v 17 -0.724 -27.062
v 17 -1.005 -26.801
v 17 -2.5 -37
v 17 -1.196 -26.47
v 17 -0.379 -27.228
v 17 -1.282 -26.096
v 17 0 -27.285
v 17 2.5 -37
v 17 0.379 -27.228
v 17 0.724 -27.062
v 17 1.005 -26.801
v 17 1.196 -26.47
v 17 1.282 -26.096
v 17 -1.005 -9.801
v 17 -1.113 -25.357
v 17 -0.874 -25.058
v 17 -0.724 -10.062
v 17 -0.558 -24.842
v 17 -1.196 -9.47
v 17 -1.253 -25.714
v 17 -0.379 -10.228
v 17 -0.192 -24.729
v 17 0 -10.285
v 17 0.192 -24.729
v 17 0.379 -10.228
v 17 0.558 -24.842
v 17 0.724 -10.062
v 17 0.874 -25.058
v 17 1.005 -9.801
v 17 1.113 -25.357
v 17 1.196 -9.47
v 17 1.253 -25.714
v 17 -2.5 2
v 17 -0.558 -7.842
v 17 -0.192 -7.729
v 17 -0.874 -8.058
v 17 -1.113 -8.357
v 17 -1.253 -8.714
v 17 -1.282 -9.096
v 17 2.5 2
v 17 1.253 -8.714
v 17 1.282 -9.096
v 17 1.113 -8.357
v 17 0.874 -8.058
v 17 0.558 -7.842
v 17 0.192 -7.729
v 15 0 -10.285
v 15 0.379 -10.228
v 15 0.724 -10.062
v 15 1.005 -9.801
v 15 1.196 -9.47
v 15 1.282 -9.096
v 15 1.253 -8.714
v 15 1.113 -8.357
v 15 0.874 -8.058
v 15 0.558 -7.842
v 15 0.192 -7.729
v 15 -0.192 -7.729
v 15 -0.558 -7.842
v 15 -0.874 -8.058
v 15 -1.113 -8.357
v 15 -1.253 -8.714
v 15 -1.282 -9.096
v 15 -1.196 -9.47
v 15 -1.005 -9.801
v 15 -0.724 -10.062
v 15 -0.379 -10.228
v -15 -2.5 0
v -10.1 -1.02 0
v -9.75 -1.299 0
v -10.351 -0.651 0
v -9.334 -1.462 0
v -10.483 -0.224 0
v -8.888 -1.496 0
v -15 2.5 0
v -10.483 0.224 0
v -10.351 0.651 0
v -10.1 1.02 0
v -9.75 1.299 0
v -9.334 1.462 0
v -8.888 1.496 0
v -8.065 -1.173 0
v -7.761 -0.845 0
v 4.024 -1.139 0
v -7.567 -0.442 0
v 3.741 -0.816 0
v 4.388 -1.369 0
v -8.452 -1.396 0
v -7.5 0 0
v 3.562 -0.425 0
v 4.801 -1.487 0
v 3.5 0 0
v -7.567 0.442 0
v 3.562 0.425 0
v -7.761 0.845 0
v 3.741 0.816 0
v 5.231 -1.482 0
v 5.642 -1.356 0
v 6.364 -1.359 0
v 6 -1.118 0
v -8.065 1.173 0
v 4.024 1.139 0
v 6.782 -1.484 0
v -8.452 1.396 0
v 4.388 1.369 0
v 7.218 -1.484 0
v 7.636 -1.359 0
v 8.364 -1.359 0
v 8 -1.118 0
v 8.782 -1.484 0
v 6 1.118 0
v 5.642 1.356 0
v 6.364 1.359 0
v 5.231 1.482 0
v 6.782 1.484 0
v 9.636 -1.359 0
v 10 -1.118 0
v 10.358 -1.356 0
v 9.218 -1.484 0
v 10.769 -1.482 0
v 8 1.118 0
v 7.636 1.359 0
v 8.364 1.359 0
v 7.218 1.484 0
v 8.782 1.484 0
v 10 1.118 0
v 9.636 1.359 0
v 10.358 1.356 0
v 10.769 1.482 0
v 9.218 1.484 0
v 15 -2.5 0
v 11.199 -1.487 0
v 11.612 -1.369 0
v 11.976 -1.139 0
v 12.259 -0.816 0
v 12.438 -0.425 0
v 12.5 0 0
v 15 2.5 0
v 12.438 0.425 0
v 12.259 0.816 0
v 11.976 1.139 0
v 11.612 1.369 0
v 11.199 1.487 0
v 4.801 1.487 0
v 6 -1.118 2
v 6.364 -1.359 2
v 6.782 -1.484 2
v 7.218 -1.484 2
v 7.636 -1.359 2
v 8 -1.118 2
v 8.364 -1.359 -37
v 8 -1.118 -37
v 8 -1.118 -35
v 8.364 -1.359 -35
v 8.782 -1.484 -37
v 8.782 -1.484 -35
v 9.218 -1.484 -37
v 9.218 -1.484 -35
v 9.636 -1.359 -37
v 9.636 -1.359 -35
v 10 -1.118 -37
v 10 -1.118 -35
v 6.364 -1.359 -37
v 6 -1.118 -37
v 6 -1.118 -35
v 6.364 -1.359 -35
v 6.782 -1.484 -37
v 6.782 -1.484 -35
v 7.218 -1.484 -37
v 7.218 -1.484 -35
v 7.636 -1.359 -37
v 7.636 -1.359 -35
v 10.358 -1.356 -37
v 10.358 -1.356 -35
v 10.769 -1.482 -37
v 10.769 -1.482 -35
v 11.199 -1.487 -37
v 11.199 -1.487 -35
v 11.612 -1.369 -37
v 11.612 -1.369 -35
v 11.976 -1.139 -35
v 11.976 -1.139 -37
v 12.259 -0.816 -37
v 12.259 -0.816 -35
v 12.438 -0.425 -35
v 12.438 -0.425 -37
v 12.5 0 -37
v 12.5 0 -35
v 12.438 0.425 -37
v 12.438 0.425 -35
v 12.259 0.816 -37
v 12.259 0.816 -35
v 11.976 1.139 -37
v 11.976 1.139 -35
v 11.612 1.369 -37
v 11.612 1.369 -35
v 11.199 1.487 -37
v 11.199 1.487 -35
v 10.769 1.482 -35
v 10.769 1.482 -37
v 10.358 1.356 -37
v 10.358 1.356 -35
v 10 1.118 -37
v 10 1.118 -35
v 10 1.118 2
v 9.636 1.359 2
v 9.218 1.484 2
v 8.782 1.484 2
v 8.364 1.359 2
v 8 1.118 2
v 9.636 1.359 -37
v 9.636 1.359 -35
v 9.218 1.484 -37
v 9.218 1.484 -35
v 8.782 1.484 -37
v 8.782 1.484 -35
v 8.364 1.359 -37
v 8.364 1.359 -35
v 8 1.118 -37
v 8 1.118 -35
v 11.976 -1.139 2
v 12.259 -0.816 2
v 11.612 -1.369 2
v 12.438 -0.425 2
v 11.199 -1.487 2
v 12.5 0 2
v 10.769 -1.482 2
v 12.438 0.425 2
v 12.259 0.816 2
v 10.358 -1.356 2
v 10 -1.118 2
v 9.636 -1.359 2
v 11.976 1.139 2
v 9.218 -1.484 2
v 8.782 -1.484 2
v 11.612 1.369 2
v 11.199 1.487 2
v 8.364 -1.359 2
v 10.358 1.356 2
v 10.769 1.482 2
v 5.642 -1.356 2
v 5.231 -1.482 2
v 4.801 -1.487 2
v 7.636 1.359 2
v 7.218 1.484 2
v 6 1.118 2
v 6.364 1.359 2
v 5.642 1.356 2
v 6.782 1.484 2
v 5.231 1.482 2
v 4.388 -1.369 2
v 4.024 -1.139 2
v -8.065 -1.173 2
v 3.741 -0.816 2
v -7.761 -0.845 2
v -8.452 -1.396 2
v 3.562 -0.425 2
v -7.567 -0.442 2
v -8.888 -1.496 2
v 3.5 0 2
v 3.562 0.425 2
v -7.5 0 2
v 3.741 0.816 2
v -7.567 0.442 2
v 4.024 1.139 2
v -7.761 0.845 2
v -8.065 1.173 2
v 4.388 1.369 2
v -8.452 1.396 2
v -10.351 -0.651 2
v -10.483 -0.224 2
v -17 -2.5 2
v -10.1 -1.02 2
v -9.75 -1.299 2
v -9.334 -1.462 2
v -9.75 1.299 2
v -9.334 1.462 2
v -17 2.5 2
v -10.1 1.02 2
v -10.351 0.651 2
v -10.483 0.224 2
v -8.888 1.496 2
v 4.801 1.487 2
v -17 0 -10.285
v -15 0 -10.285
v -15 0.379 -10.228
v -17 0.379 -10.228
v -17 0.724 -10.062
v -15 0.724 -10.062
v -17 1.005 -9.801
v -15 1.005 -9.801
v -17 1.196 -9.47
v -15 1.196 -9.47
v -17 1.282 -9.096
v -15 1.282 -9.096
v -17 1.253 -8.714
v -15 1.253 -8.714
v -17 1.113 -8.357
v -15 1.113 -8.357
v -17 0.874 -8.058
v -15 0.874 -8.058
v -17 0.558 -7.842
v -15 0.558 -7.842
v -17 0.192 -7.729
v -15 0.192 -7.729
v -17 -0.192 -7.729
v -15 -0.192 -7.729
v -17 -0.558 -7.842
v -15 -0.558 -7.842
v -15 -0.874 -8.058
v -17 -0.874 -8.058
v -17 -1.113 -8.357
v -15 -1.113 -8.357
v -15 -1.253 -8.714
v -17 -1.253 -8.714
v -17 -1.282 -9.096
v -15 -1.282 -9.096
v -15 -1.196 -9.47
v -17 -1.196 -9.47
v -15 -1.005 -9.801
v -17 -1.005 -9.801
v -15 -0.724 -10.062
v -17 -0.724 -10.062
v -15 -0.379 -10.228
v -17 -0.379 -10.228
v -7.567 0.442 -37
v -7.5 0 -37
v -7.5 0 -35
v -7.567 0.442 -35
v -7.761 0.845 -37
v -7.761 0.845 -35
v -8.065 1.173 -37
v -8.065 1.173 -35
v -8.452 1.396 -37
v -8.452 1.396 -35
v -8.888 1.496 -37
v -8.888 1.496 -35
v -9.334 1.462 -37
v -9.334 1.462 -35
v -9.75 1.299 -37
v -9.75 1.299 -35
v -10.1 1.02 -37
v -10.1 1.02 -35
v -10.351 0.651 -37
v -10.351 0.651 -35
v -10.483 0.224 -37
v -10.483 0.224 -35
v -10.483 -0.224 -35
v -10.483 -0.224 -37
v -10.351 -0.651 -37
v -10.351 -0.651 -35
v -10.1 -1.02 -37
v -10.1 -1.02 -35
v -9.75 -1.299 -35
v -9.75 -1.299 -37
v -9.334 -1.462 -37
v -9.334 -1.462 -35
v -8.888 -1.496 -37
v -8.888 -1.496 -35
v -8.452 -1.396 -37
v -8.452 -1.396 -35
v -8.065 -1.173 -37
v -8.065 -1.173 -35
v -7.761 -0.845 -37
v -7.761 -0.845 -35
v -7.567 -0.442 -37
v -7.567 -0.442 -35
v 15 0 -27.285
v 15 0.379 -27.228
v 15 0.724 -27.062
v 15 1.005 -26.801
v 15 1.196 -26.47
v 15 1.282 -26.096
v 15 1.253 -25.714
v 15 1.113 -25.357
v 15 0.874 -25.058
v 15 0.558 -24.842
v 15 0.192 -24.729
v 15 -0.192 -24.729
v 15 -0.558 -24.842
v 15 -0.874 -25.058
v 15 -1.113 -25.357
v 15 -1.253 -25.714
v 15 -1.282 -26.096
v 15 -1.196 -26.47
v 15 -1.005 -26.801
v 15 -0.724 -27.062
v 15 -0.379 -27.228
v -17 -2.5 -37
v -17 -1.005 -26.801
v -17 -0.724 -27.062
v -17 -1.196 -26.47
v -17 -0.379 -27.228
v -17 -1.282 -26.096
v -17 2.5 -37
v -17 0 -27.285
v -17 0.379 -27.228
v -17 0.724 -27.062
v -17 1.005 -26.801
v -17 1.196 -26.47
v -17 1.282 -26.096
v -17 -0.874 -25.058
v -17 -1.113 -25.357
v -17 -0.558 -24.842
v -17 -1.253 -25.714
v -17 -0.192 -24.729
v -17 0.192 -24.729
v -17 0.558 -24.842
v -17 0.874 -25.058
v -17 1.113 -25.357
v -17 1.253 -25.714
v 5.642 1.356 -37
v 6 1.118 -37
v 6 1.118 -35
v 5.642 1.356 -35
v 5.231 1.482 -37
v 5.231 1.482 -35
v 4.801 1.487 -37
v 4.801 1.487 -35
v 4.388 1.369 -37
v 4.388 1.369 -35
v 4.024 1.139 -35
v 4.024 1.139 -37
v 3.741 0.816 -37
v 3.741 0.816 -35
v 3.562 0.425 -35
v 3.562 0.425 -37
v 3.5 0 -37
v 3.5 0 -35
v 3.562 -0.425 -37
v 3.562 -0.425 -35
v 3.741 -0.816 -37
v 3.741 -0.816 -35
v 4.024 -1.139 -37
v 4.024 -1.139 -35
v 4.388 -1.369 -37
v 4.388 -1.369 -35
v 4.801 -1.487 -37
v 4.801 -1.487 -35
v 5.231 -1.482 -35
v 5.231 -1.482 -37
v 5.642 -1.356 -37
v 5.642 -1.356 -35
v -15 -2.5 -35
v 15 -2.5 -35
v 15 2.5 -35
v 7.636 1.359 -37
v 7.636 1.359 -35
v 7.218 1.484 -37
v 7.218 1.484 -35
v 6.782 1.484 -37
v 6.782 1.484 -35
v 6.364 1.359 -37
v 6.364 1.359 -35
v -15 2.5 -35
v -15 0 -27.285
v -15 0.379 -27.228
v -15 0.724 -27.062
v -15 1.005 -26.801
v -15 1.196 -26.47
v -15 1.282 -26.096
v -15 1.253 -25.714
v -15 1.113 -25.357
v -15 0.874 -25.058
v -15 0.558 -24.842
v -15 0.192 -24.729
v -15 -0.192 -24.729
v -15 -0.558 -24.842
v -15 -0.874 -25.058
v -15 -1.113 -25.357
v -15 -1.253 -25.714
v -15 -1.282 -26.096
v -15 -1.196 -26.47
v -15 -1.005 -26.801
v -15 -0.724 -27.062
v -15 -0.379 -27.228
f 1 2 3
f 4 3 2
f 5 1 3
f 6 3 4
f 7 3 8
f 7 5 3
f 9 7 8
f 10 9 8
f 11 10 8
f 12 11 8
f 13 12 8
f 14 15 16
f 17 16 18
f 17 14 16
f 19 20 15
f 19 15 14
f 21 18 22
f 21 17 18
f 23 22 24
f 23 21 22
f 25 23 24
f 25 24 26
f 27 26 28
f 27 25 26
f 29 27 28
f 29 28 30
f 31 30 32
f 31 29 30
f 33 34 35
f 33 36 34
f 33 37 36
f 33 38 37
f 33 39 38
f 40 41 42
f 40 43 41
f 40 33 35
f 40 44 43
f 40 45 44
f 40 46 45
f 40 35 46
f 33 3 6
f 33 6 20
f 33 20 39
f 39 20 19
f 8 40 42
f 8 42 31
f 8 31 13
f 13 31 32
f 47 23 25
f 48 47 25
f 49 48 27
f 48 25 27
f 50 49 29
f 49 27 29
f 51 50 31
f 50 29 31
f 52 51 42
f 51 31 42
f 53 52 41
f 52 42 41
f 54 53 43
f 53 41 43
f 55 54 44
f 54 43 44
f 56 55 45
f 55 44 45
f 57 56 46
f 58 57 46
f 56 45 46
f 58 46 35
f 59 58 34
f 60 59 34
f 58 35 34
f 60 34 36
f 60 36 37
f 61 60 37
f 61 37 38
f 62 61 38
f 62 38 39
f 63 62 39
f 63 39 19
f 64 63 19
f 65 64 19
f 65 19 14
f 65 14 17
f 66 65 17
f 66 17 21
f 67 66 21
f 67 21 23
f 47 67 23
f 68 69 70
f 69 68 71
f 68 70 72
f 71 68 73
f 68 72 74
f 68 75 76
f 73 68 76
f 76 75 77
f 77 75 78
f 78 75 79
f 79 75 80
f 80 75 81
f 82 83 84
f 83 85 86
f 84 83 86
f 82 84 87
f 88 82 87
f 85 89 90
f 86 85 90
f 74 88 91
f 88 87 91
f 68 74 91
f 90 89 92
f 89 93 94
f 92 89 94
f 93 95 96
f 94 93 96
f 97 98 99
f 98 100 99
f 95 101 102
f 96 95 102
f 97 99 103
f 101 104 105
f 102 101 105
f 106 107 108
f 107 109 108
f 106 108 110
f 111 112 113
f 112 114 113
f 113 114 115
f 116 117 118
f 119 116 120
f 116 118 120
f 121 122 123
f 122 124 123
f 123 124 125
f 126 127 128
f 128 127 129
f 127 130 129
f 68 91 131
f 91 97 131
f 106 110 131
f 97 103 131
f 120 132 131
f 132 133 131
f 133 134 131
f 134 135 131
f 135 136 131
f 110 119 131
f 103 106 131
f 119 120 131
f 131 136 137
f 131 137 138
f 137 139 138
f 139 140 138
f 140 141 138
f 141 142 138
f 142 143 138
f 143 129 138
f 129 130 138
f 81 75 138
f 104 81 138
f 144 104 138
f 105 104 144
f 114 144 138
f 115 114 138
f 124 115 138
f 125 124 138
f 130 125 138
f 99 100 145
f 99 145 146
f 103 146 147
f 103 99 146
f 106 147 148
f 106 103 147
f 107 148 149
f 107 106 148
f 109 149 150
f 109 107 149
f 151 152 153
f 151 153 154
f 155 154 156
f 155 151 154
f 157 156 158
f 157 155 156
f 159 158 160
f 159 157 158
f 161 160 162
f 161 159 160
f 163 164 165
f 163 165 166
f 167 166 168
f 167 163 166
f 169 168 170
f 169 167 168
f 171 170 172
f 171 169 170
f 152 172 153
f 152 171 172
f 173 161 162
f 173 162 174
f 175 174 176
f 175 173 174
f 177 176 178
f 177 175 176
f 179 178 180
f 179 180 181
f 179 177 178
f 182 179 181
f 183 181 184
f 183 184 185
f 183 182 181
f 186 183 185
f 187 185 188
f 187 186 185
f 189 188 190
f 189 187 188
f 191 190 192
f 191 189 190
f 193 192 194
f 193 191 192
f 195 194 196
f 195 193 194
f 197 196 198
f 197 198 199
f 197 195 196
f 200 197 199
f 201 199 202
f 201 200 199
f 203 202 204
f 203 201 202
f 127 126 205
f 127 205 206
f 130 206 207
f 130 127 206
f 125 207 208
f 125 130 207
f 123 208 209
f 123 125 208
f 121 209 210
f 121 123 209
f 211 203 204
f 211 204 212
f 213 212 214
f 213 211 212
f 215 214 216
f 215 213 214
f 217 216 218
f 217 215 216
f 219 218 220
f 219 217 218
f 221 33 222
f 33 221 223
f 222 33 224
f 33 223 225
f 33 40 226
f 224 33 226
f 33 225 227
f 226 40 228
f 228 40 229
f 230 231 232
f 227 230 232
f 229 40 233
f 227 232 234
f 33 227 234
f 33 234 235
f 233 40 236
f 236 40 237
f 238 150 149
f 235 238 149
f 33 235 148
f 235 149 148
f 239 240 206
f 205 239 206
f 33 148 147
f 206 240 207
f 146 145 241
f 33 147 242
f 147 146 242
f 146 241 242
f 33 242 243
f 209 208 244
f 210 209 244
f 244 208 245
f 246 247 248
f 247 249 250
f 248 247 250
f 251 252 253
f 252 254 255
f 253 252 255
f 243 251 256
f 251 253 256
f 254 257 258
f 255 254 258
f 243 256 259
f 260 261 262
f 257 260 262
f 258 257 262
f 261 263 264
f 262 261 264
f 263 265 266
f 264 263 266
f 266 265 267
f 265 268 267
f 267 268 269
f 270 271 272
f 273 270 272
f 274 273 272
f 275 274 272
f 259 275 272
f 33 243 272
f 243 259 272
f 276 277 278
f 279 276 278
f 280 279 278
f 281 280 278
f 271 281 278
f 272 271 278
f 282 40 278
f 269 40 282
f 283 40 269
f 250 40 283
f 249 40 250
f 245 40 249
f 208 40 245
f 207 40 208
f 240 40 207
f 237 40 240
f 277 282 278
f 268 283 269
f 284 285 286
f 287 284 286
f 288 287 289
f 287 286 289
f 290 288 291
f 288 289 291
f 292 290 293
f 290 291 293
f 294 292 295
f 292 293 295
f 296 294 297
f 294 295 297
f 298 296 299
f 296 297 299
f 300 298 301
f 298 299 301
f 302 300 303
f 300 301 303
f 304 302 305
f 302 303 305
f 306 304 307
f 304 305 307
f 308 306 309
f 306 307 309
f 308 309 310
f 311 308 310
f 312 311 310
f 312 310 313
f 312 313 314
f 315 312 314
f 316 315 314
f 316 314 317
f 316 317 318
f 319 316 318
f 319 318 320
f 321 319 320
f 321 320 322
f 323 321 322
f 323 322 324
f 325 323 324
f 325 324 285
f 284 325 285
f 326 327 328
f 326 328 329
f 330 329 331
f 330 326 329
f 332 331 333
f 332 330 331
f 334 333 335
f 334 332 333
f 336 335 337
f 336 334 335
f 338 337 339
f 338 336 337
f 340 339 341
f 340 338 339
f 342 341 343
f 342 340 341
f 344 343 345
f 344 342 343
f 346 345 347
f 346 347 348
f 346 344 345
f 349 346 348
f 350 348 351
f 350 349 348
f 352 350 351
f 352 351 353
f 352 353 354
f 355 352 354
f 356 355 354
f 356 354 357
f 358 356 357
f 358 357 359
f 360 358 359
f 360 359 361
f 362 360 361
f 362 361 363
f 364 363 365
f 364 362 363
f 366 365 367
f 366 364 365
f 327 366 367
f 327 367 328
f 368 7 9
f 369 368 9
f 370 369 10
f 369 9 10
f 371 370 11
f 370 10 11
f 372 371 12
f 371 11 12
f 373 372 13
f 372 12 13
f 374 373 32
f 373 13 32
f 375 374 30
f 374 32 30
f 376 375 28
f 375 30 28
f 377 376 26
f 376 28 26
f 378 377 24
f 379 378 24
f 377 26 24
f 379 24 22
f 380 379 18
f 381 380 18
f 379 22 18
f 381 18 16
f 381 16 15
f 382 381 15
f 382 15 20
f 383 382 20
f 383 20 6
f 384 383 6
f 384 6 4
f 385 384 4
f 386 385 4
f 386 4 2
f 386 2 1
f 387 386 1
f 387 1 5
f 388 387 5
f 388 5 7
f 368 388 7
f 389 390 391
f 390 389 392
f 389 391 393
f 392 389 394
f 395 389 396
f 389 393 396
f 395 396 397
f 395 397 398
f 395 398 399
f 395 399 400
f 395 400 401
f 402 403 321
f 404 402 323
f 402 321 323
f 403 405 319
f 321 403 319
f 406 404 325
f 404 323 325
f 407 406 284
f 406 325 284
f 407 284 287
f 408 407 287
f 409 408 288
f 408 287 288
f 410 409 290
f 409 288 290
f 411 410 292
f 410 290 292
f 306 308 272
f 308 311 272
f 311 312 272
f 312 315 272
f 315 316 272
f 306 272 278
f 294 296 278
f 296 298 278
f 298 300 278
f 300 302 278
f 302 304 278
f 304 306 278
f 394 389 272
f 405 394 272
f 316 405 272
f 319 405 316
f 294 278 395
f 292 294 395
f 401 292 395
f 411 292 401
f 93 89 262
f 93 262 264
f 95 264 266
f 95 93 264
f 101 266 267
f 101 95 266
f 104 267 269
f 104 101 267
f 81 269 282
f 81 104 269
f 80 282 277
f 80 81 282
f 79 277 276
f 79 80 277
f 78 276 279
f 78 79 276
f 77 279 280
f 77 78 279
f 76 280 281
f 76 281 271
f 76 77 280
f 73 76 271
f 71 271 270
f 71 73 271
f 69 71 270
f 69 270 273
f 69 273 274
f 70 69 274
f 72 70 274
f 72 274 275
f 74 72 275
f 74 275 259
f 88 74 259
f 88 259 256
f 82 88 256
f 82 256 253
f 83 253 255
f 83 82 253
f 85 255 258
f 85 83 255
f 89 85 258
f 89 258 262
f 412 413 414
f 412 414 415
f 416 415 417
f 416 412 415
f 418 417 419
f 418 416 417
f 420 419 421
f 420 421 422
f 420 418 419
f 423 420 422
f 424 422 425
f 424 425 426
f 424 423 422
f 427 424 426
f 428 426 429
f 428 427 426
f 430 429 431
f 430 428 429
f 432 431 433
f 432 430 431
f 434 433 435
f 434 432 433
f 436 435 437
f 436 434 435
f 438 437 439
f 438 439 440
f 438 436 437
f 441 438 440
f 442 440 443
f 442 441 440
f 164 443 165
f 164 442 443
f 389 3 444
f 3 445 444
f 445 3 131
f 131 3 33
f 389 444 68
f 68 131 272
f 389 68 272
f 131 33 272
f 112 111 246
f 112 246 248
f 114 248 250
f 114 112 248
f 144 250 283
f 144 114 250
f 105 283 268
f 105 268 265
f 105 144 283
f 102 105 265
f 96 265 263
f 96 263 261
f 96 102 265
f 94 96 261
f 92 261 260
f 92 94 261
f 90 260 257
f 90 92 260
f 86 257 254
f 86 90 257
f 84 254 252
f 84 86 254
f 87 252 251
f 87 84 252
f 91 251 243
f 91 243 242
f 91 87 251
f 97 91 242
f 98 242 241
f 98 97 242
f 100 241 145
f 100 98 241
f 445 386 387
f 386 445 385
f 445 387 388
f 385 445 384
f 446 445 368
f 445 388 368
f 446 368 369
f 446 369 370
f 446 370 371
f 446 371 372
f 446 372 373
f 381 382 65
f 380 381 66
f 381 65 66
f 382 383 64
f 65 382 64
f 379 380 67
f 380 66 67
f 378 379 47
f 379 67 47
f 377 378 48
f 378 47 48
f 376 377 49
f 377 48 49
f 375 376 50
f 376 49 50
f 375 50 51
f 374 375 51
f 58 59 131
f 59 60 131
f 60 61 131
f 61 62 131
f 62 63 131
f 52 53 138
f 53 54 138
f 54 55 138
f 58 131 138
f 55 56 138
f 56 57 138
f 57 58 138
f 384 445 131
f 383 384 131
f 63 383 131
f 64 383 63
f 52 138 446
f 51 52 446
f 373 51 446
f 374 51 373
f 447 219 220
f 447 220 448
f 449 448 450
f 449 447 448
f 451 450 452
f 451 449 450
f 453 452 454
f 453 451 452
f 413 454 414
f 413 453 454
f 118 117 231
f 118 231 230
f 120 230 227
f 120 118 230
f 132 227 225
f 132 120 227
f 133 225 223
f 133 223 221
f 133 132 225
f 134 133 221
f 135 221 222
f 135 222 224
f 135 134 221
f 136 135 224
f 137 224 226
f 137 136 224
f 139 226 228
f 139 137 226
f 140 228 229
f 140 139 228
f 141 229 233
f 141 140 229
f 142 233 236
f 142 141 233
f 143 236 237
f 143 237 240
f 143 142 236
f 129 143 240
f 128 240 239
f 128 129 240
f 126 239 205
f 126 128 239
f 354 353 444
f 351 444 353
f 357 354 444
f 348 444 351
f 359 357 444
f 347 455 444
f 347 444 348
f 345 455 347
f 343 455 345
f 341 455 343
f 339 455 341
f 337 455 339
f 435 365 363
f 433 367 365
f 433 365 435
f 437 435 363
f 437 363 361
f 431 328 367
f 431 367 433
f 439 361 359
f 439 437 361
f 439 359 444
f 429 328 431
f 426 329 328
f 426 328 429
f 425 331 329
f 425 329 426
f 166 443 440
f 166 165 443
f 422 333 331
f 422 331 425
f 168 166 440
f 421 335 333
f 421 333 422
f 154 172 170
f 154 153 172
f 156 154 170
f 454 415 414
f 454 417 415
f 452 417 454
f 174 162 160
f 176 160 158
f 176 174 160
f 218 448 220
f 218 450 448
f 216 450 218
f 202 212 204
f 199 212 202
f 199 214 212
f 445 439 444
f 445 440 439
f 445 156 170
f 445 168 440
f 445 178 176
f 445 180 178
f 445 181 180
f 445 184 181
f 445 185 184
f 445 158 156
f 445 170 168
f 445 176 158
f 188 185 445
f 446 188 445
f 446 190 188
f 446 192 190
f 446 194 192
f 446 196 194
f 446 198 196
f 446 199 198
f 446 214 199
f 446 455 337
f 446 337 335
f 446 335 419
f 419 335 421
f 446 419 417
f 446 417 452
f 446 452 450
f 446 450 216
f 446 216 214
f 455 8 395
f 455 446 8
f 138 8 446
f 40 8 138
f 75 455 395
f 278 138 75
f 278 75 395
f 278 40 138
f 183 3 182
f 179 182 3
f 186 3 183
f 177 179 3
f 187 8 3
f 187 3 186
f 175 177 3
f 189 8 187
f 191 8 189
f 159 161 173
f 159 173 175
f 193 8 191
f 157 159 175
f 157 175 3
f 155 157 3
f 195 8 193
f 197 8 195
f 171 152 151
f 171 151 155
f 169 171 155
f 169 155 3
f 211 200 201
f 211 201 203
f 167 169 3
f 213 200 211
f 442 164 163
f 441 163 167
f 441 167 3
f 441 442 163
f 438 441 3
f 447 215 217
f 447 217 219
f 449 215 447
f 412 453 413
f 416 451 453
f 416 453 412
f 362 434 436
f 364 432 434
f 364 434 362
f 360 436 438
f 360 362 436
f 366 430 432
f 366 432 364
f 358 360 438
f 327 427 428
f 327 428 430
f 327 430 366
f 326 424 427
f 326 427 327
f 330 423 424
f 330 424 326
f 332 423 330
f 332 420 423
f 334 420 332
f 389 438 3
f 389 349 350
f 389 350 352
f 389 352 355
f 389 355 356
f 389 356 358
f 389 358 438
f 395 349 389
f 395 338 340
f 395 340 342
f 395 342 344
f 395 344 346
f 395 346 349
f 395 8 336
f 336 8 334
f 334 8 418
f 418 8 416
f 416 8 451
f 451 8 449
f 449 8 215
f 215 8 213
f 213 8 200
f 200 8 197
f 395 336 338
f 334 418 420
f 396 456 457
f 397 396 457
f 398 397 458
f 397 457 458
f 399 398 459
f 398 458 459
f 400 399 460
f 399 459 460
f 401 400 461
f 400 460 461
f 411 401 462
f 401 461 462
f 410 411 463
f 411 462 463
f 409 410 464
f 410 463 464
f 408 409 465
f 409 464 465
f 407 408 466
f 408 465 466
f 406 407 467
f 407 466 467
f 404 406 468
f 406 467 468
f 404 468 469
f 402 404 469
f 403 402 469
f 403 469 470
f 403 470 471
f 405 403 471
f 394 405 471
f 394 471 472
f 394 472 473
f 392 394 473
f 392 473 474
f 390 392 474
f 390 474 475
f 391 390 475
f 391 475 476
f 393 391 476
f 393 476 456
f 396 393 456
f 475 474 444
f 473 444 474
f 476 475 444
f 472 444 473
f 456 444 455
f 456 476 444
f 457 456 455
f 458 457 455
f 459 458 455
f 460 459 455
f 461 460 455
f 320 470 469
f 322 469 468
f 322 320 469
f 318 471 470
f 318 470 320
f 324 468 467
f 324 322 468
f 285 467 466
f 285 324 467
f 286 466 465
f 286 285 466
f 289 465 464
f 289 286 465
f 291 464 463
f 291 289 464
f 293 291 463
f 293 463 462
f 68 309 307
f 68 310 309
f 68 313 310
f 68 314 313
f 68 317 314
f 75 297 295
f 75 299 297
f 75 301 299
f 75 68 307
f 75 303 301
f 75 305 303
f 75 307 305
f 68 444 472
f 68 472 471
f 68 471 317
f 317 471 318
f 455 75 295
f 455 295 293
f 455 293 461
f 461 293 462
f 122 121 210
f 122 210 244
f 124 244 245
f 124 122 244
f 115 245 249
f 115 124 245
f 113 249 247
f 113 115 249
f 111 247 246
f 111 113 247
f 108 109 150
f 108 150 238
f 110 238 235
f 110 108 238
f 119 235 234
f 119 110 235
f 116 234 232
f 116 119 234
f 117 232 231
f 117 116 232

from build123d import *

# Parameters (mm, degrees)
ESBO_O1_W                = 30
ESBO_O1_H                = 5
ESBO_O1_R                = 1.5
RESSALTO_EXTRUS_O1_DEPTH = 2
ESBO_O3_W                = 2
ESBO_O3_H                = 5
RESSALTO_EXTRUS_O2_DEPTH = 39
PADR_O_LINEAR1_COUNT     = 2
PADR_O_LINEAR1_PITCH     = 37
ESBO_O4_R                = 1.285304246
CORTE_EXTRUS_O1_DEPTH    = 39


with BuildPart() as part:
    # Esboço1 → Ressalto-extrusão1 (new body)
    with BuildSketch(Plane.XY):
        Rectangle(ESBO_O1_W, ESBO_O1_H)
        with Locations((-9, 0)):
            Circle(ESBO_O1_R, mode=Mode.SUBTRACT)
        with BuildLine():
            ThreePointArc((6, 1.118033989), (3.5, 0), (6, -1.118033989))
            ThreePointArc((6, -1.118033989), (7, -1.5), (8, -1.118033989))
            ThreePointArc((8, -1.118033989), (9, -1.5), (10, -1.118033989))
            ThreePointArc((10, -1.118033989), (12.5, 0), (10, 1.118033989))
            ThreePointArc((10, 1.118033989), (9, 1.5), (8, 1.118033989))
            ThreePointArc((8, 1.118033989), (7, 1.5), (6, 1.118033989))
        make_face(mode=Mode.SUBTRACT)
    ressalto_extrus_o1 = extrude(amount=RESSALTO_EXTRUS_O1_DEPTH)

    # Esboço3 → Ressalto-extrusão2 (add)
    with BuildSketch(Plane.XY.offset(2)):
        with Locations((16, 0)):
            Rectangle(ESBO_O3_W, ESBO_O3_H)
    ressalto_extrus_o2 = extrude(amount=-RESSALTO_EXTRUS_O2_DEPTH)

    # Padrão linear1: Ressalto-extrusão1 ×2
    with Locations(*[(0, 0, -i * PADR_O_LINEAR1_PITCH) for i in range(1, PADR_O_LINEAR1_COUNT)]):
        add(ressalto_extrus_o1)

    # Espelhar1: Ressalto-extrusão2 across plane
    add(ressalto_extrus_o2.mirror(Plane(origin=(0, 0, 0), x_dir=(0, 0, 1), z_dir=(1, 0, 0))))

    # Esboço4 → Corte-extrusão1 (cut)
    with BuildSketch(Plane(origin=(17, 0, 0), x_dir=(0, 0, -1), z_dir=(1, 0, 0))):
        with Locations((9, 0)):
            Circle(ESBO_O4_R)
        with Locations((26, 0)):
            Circle(ESBO_O4_R)
    extrude(amount=-CORTE_EXTRUS_O1_DEPTH, mode=Mode.SUBTRACT)


solid = part.part
